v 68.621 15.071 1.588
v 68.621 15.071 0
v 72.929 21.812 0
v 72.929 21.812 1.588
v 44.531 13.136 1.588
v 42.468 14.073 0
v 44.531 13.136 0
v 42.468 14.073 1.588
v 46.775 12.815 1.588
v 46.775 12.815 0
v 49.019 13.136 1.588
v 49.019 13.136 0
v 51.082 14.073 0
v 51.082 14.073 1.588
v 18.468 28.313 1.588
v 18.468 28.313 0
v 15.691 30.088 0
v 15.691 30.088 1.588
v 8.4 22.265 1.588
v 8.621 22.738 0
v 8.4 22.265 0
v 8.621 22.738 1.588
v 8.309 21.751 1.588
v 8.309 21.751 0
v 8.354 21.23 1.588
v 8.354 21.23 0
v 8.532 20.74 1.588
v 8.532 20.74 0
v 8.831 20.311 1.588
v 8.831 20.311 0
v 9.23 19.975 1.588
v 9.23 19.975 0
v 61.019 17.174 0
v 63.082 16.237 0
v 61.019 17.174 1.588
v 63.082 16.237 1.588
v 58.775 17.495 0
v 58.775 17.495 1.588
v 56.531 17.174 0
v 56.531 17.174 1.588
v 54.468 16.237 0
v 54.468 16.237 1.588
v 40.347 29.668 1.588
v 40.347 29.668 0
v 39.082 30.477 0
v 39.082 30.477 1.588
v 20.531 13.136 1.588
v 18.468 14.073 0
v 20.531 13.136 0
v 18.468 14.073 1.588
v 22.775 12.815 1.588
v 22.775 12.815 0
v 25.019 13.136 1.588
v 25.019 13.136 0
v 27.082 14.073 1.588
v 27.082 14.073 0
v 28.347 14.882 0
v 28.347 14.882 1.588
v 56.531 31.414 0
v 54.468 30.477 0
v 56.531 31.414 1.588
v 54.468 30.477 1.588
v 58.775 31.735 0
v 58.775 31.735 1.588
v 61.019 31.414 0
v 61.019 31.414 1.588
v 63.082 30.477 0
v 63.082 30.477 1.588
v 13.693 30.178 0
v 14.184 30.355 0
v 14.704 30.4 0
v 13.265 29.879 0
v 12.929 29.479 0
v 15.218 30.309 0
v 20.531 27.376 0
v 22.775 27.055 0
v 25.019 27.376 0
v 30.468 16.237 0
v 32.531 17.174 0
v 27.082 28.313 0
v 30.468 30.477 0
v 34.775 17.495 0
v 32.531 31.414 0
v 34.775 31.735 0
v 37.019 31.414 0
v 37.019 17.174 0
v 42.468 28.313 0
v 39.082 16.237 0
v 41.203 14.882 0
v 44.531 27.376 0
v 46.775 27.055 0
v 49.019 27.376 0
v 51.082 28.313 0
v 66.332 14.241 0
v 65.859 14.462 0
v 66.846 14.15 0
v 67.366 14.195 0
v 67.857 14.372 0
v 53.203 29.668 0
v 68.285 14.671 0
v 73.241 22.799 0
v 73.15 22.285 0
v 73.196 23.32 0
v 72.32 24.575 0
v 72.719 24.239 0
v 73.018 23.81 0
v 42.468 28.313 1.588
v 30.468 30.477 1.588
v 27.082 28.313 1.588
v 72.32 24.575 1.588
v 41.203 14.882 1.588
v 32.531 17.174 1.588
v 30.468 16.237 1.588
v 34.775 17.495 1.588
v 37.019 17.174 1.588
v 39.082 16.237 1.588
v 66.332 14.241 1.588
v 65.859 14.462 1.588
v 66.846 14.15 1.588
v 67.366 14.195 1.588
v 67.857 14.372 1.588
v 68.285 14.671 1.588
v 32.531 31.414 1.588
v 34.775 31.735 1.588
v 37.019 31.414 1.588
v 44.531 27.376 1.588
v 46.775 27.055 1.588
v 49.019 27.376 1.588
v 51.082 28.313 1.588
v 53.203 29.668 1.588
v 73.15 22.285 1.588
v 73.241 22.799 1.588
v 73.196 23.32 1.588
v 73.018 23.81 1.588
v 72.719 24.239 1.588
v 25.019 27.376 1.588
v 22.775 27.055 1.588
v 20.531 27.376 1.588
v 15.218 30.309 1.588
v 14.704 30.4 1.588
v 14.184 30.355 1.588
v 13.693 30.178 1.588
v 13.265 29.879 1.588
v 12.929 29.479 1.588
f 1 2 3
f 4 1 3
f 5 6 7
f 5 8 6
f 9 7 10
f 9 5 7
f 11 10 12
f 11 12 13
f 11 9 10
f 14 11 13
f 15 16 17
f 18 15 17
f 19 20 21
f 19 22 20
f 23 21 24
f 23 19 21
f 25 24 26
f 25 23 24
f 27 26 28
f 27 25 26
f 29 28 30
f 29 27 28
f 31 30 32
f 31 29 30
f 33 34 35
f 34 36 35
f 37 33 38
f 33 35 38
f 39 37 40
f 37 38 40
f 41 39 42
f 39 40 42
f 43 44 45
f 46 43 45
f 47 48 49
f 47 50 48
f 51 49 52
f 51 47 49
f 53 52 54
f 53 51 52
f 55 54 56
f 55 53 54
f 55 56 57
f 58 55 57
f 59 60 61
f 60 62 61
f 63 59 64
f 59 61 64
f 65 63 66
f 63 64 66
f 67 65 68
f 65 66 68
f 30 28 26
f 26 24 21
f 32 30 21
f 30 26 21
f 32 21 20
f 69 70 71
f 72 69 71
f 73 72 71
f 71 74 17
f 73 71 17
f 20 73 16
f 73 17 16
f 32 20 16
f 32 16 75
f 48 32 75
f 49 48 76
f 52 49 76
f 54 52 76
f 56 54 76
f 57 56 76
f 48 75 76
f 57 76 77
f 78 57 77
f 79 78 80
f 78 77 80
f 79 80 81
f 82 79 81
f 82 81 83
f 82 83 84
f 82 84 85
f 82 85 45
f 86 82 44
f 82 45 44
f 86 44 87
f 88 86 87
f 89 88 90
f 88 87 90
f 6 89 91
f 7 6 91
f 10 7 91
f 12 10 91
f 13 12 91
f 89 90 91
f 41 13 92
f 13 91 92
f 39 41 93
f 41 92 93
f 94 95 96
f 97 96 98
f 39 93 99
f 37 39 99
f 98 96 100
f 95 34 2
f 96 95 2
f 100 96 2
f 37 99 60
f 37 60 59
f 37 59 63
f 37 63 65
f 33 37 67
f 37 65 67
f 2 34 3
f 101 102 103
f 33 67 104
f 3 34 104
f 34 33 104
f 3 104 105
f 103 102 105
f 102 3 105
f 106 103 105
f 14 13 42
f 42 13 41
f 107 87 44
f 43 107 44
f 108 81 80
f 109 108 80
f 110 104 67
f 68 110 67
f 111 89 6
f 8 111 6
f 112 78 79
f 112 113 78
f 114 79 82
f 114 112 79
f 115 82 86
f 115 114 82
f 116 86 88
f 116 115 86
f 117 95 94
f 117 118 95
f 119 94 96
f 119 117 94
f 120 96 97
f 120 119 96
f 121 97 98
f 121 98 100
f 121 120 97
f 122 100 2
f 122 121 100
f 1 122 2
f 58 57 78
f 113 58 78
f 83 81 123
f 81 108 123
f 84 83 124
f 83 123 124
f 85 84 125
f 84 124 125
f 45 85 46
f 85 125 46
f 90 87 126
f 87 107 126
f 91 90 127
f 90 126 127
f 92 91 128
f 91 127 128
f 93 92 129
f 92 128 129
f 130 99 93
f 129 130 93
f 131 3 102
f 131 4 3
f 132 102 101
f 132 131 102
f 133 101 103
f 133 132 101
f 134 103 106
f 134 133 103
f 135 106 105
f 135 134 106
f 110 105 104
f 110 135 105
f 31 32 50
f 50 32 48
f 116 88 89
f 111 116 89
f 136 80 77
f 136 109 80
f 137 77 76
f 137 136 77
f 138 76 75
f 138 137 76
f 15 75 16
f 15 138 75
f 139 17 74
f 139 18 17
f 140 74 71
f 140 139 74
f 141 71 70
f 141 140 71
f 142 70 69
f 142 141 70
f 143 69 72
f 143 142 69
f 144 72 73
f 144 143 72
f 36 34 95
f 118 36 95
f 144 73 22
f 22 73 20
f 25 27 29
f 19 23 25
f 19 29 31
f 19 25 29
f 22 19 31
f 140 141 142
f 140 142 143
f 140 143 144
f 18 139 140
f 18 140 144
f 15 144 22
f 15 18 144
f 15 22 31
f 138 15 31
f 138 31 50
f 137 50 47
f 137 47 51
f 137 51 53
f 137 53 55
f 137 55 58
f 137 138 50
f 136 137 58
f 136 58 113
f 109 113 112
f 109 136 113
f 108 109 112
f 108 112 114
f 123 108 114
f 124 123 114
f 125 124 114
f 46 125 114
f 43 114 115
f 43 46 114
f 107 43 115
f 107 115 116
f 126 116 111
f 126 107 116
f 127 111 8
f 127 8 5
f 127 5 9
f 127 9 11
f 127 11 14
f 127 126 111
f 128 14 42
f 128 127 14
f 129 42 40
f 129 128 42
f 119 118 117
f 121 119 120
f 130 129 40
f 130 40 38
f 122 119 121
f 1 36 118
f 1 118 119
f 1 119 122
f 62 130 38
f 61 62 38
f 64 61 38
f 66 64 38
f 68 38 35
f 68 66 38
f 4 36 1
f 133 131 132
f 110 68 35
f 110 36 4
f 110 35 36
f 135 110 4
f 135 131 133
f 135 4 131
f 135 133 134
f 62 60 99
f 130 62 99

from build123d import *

# Parameters (mm, degrees)
BOSS_EXTRUDE1_DEPTH = 1.5875
FILLET1_R           = 2
FILLET3_R           = 8
FILLET4_R           = 8


with BuildPart() as part:
    # Sketch3 → Boss-Extrude1 (new body)
    with BuildSketch(Plane.XY):
        Polygon((58.775, 33.228336454), (53.202823644, 29.668334894), (46.775, 25.561669788), (40.347176356, 29.668334894), (34.775, 33.228336454), (22.775, 25.561669788), (14.005335663, 31.164510892), (7.544664337, 21.052155774), (22.775, 11.321663546), (28.347176356, 14.881665106), (34.775, 18.988330212), (41.202823644, 14.881665106), (46.775, 11.321663546), (58.775, 18.988330212), (67.544664337, 13.385489108), (74.005335663, 23.497844226), align=None)
    extrude(amount=BOSS_EXTRUDE1_DEPTH)

    # Fillet1
    fillet1_edges = [part.edges().sort_by_distance(p)[0] for p in [
        (7.544664337, 21.052155774, 0.79375),
        (14.005335663, 31.164510892, 0.79375),
        (74.005335663, 23.497844226, 0.79375),
        (67.544664337, 13.385489108, 0.79375),
    ]]
    fillet(fillet1_edges, radius=FILLET1_R)

    # Fillet3
    fillet3_edges = [part.edges().sort_by_distance(p)[0] for p in [
        (46.775, 11.321663546, 0.79375),
        (22.775, 11.321663546, 0.79375),
        (34.775, 33.228336454, 0.79375),
        (58.775, 33.228336454, 0.79375),
    ]]
    fillet(fillet3_edges, radius=FILLET3_R)

    # Fillet4
    fillet4_edges = [part.edges().sort_by_distance(p)[0] for p in [
        (34.775, 18.988330212, 0.79375),
        (22.775, 25.561669788, 0.79375),
        (46.775, 25.561669788, 0.79375),
        (58.775, 18.988330212, 0.79375),
    ]]
    fillet(fillet4_edges, radius=FILLET4_R)


solid = part.part
